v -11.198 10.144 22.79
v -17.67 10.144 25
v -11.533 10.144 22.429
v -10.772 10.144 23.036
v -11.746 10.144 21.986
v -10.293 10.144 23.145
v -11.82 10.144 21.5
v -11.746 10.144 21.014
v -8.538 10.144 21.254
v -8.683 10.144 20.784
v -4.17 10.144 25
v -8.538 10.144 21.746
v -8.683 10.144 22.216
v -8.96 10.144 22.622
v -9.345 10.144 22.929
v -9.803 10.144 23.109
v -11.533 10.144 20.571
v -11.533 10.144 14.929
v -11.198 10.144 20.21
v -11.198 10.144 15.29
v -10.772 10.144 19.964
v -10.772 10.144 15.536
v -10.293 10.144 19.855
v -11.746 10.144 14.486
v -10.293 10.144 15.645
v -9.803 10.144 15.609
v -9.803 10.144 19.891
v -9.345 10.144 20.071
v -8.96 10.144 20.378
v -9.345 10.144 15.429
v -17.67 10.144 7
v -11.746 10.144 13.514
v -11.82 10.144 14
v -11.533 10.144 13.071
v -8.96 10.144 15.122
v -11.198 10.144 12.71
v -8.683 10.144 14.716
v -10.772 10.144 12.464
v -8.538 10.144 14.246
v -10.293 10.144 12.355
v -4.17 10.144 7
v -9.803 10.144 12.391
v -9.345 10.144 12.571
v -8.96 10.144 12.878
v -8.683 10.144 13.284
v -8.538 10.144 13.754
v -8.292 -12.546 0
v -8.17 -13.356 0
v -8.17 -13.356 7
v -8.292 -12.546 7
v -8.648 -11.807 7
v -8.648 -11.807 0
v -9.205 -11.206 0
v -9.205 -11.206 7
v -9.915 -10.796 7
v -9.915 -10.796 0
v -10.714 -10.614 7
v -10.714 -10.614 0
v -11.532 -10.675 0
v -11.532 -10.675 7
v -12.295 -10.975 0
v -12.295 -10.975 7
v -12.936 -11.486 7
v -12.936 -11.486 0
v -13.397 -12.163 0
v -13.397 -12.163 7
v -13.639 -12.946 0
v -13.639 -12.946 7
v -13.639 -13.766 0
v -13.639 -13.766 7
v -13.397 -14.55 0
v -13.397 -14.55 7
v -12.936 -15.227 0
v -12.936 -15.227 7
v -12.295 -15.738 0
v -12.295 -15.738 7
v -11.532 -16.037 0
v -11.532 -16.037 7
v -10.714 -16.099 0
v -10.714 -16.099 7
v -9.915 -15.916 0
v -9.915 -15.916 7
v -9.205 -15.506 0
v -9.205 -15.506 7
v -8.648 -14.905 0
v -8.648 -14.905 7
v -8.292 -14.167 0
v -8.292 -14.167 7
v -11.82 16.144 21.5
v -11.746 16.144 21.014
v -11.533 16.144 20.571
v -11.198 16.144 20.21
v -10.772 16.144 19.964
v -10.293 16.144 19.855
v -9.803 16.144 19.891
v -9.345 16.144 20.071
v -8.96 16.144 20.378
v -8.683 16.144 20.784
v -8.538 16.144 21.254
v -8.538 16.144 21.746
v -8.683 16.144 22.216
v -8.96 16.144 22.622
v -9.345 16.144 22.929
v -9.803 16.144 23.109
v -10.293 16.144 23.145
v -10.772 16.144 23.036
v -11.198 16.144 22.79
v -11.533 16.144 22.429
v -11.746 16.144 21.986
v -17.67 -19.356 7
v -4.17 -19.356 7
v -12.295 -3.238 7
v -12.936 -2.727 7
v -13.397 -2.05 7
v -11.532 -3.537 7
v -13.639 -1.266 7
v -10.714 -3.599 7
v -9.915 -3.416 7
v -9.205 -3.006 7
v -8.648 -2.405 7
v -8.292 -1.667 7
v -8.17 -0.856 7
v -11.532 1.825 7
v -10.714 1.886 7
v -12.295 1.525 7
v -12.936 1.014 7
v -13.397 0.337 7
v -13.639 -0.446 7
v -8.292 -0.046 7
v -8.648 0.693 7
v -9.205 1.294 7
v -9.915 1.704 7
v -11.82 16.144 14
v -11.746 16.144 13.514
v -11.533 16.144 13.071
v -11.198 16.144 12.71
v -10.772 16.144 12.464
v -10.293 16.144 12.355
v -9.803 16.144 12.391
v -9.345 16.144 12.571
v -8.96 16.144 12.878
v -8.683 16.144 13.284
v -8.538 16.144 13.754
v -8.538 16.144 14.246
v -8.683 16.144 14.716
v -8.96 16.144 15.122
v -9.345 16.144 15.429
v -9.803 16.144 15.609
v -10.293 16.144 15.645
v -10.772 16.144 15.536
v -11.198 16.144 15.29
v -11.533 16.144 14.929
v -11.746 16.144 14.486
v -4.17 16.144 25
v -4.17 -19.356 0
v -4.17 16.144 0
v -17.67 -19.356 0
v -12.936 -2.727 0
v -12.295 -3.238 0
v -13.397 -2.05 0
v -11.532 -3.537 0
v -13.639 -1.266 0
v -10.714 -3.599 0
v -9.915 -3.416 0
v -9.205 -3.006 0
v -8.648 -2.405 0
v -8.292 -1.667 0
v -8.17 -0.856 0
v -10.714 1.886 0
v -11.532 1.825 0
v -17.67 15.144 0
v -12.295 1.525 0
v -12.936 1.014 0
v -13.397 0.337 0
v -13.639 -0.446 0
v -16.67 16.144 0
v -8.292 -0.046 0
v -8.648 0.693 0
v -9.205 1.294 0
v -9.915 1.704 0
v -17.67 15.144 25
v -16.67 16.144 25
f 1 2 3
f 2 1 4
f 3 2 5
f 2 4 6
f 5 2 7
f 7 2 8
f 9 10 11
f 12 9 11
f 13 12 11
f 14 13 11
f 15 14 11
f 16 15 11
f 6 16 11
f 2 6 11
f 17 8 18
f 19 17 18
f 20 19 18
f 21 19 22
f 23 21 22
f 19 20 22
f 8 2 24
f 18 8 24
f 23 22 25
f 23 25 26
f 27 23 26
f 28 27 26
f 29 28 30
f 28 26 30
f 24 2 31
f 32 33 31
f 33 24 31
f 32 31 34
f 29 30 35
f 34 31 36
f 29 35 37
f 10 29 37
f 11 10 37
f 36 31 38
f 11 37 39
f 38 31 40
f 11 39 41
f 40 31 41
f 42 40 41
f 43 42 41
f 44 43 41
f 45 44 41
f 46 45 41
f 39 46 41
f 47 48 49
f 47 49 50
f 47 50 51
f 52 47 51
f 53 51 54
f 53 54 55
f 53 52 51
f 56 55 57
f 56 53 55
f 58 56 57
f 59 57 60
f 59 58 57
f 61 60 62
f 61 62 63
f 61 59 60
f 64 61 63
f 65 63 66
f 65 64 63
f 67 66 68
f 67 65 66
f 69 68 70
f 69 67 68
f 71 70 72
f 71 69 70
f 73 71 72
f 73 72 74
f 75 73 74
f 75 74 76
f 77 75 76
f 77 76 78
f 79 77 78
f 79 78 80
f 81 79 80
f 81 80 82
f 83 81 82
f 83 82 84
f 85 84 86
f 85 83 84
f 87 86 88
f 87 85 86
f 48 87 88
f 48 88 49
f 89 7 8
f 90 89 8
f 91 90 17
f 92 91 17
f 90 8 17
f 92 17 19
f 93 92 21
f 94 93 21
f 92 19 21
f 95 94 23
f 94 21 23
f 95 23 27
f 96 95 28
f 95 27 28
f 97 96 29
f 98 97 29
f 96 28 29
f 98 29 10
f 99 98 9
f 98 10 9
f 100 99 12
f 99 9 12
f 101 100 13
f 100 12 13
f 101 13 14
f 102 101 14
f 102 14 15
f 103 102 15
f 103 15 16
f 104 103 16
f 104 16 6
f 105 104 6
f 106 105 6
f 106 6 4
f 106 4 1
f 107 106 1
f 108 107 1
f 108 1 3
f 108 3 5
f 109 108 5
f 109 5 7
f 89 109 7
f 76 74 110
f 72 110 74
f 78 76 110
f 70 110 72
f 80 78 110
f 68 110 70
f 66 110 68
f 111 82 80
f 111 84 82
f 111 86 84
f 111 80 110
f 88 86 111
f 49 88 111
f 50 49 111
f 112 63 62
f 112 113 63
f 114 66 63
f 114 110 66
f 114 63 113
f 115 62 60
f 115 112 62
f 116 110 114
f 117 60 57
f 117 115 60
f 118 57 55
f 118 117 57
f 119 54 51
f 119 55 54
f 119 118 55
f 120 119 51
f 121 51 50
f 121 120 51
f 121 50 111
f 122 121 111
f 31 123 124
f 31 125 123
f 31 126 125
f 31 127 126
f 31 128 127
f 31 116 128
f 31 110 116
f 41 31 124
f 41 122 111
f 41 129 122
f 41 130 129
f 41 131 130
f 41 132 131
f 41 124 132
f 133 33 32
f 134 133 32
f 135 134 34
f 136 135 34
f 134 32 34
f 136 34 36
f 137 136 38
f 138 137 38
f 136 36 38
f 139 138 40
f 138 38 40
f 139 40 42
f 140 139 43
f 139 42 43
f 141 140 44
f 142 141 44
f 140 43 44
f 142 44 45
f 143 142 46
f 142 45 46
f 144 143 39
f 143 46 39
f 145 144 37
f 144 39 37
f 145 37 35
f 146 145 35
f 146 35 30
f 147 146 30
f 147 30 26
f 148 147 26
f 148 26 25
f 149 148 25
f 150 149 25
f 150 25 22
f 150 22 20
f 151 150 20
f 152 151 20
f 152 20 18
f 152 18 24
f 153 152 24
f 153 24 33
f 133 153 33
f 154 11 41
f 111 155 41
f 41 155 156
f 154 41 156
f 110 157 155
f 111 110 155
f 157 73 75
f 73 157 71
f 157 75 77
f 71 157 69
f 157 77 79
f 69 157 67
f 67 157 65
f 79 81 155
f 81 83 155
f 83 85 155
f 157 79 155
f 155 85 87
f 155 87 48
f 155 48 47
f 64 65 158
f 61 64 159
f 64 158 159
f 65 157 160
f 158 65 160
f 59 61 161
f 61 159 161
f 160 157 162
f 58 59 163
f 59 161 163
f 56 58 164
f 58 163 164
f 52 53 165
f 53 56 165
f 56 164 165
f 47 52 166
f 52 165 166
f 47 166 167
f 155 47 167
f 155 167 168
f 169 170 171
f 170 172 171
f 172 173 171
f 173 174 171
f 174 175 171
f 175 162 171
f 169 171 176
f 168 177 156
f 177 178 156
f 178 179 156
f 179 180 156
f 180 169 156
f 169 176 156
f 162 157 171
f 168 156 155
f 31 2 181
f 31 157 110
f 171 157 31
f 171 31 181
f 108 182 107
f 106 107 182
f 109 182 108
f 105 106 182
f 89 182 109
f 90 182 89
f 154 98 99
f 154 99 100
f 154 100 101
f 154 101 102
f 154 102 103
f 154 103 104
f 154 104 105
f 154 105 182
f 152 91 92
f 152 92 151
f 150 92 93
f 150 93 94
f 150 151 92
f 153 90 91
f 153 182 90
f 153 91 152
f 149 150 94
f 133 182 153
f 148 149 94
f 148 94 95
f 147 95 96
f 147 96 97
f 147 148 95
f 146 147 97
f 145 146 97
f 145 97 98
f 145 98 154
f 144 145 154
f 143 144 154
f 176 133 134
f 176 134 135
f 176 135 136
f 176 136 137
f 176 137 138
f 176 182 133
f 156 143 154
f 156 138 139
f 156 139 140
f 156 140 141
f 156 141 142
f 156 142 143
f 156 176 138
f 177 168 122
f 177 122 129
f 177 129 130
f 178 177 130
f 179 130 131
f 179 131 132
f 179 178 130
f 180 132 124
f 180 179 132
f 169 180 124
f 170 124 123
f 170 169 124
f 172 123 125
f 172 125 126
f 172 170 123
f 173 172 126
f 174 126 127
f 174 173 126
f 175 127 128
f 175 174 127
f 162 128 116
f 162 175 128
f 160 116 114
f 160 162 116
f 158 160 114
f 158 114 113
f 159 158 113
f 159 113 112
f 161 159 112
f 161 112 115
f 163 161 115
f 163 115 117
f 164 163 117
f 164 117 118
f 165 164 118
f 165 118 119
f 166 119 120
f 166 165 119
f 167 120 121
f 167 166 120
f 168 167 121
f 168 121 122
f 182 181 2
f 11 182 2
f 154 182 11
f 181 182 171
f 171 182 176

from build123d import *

# Parameters (mm, degrees)
SKETCH1_W             = 13.5
SKETCH1_H             = 35.5
SKETCH1_R             = 2.75
BOSS_EXTRUDE1_DEPTH   = 7
SKETCH2_W             = 13.5
SKETCH2_H             = 6
BOSS_EXTRUDE2_DEPTH   = 18
CHAMFER1_SIZE         = 1
M4X0_7_TAPPED_HOLE1_D = 3.3


with BuildPart() as part:
    # Sketch1 → Boss-Extrude1 (new body)
    with BuildSketch(Plane.XY):
        with Locations((-10.919683258, -1.606334842)):
            Rectangle(SKETCH1_W, SKETCH1_H)
        with Locations((-10.919683258, -13.356334842)):
            Circle(SKETCH1_R, mode=Mode.SUBTRACT)
        with Locations((-10.919683258, -0.856334842)):
            Circle(SKETCH1_R, mode=Mode.SUBTRACT)
    extrude(amount=BOSS_EXTRUDE1_DEPTH)

    # Sketch2 → Boss-Extrude2 (add)
    with BuildSketch(Plane.XY.offset(7)):
        with Locations((-10.919683258, 13.143665158)):
            Rectangle(SKETCH2_W, SKETCH2_H)
    extrude(amount=BOSS_EXTRUDE2_DEPTH)

    # Chamfer1
    chamfer1_edges = [part.edges().sort_by_distance(p)[0] for p in [
        (-17.669683258, 16.143665158, 12.5),
    ]]
    chamfer(chamfer1_edges, length=CHAMFER1_SIZE)

    # M4x0.7 Tapped Hole1 (through all)
    with Locations(Plane(origin=(0, 16.143665158, 0), x_dir=(1, 0, 0), z_dir=(0, 1, 0))):
        with Locations((-10.169683258, -21.5), (-10.169683258, -14)):
            Hole(M4X0_7_TAPPED_HOLE1_D / 2)


solid = part.part
